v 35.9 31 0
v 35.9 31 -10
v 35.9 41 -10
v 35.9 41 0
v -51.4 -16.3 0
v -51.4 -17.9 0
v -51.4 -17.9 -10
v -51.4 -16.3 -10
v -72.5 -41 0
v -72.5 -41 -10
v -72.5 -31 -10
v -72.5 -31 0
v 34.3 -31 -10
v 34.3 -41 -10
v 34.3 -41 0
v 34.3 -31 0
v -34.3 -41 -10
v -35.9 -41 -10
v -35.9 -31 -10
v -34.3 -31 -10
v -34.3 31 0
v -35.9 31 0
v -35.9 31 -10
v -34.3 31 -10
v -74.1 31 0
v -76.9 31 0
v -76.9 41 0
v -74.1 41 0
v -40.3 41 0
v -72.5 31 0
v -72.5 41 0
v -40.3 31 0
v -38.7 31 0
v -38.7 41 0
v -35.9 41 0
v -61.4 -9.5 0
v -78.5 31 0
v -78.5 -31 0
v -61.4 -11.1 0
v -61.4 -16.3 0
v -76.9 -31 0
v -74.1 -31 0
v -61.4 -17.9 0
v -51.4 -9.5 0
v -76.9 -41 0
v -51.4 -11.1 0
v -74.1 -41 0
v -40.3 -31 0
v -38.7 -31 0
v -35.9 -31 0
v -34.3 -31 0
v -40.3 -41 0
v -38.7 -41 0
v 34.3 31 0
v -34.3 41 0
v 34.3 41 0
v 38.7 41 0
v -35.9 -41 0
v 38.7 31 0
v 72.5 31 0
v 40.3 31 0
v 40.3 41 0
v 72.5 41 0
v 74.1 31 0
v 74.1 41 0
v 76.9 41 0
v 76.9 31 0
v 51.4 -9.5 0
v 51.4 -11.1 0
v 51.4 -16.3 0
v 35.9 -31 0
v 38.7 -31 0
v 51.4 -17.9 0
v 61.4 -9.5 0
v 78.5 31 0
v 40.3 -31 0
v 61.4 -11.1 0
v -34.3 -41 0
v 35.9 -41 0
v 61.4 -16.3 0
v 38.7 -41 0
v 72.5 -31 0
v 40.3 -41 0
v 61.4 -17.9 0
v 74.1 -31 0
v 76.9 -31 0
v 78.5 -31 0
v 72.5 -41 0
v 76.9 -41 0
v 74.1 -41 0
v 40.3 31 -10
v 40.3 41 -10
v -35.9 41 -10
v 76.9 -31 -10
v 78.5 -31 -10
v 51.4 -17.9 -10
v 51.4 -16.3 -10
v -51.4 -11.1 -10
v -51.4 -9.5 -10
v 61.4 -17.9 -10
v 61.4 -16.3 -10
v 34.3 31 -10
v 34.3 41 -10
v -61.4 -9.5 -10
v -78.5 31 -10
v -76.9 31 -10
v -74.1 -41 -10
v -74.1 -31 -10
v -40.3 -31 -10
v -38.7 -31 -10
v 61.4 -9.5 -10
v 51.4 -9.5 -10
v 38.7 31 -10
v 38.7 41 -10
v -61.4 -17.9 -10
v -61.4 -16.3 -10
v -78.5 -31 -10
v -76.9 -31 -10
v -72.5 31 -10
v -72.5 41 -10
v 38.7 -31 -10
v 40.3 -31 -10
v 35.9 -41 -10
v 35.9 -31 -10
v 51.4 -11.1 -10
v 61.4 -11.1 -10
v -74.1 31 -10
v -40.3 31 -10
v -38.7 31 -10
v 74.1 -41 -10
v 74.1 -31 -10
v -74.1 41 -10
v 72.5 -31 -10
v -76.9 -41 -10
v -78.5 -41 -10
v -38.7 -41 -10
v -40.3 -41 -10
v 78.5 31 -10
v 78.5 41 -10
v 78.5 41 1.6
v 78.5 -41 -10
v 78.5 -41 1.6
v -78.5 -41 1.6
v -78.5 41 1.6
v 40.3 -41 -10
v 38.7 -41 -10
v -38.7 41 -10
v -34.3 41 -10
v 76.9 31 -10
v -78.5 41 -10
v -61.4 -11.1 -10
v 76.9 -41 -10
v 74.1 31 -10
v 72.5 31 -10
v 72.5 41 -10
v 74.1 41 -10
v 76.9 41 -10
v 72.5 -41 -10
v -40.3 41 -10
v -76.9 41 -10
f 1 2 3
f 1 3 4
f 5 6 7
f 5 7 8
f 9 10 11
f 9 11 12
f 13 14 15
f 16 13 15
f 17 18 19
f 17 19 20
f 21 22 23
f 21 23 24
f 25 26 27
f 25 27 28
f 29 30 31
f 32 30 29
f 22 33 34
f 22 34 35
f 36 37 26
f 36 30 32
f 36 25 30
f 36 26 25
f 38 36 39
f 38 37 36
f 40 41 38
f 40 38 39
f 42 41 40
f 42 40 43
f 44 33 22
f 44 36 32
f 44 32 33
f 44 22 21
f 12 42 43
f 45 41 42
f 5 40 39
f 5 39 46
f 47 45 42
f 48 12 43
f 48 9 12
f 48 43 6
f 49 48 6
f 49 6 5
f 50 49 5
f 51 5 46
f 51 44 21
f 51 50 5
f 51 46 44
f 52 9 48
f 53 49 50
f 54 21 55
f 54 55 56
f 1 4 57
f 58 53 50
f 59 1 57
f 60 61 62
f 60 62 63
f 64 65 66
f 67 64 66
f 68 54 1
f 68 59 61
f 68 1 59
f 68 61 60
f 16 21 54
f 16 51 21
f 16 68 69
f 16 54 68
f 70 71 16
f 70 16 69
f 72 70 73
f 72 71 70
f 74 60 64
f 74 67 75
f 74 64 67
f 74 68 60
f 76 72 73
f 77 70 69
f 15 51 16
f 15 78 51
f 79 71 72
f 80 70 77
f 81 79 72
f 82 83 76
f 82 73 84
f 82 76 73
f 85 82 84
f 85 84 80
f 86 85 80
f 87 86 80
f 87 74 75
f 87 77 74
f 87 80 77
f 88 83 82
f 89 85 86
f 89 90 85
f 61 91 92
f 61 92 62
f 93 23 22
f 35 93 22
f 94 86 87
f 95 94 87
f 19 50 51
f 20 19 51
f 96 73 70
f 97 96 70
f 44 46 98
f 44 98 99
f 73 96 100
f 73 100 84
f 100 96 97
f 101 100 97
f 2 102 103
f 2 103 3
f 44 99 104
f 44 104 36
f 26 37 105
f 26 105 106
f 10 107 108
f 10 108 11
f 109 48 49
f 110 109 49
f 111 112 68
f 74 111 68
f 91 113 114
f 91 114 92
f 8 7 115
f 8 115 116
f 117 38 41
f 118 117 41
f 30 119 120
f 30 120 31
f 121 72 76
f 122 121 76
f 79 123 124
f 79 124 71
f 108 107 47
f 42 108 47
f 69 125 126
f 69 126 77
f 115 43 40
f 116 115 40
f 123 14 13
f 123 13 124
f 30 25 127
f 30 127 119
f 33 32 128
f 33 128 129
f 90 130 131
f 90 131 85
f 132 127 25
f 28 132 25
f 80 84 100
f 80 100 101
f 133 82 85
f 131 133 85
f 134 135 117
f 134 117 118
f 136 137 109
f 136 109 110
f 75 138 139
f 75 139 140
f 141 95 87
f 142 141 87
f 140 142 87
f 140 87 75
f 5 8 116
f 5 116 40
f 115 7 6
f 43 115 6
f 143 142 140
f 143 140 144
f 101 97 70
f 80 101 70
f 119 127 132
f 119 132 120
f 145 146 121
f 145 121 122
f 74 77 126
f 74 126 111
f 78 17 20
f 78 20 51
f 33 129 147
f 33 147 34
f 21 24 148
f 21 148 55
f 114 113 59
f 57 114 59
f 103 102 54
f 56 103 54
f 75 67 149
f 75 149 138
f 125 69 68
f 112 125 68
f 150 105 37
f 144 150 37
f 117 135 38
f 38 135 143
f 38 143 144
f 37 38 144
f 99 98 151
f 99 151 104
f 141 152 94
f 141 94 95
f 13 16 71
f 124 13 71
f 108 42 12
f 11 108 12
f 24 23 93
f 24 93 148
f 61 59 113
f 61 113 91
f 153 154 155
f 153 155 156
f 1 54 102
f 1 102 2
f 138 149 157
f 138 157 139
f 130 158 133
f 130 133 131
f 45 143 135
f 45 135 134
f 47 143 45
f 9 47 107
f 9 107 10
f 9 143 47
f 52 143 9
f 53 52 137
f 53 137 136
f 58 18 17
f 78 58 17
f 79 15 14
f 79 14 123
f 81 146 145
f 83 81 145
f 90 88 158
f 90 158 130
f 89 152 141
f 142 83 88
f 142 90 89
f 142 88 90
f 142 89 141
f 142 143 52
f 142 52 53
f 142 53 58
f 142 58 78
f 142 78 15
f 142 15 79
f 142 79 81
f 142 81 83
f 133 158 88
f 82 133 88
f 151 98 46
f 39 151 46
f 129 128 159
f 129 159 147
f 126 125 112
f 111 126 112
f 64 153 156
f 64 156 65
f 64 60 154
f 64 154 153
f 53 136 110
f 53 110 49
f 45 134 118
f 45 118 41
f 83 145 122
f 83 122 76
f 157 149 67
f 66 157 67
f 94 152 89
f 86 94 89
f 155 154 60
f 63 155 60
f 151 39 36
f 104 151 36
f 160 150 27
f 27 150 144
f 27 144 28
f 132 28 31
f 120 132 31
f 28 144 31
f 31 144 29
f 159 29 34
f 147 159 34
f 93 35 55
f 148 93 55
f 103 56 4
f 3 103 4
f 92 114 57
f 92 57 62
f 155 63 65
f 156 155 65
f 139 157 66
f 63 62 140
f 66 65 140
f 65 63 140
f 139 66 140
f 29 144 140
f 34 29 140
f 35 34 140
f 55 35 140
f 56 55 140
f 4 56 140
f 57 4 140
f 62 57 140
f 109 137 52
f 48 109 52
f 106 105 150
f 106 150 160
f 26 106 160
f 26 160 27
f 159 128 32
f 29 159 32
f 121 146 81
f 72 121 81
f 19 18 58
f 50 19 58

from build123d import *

# Parameters (mm, degrees)
F2_DEPTH = 82
F1_W     = 1.6
F1_H     = 10
F3_DEPTH = 10
F4_START = -72
F4_DEPTH = 10
F6_W     = 1.6
F6_H     = 10
F7_DEPTH = 10
F8_START = 102.8
F8_DEPTH = 10


with BuildPart() as f2:
    # F1 (on offset) → F2 (new body)
    with BuildSketch(Plane.XZ.offset(41)):
        Polygon((78.5, 0), (78.5, 1.6), (-78.5, 1.6), (-78.5, 0), (-76.9, 0), (-74.1, 0), (-72.5, 0), (-40.3, 0), (-38.7, 0), (-35.9, 0), (-34.3, 0), (34.3, 0), (35.9, 0), (38.7, 0), (40.3, 0), (72.5, 0), (74.1, 0), (76.9, 0), align=None)
    extrude(amount=-F2_DEPTH)

    # F1 (on offset) → F3 (join)
    with BuildSketch(Plane.XZ.offset(41)):
        with Locations((-77.7, -5)):
            Rectangle(F1_W, F1_H)
        with Locations((-73.3, -5)):
            Rectangle(F1_W, F1_H)
        with Locations((-39.5, -5)):
            Rectangle(F1_W, F1_H)
        with Locations((-35.1, -5)):
            Rectangle(F1_W, F1_H)
        with Locations((35.1, -5)):
            Rectangle(F1_W, F1_H)
        with Locations((39.5, -5)):
            Rectangle(F1_W, F1_H)
        with Locations((73.3, -5)):
            Rectangle(F1_W, F1_H)
        with Locations((77.7, -5)):
            Rectangle(F1_W, F1_H)
    extrude(amount=-F3_DEPTH)

    # F1 (on offset) → F4 (join)
    with BuildSketch(Plane.XZ.offset(41).offset(F4_START)):
        with Locations((-77.7, -5)):
            Rectangle(F1_W, F1_H)
        with Locations((-73.3, -5)):
            Rectangle(F1_W, F1_H)
        with Locations((-39.5, -5)):
            Rectangle(F1_W, F1_H)
        with Locations((-35.1, -5)):
            Rectangle(F1_W, F1_H)
        with Locations((39.5, -5)):
            Rectangle(F1_W, F1_H)
        with Locations((35.1, -5)):
            Rectangle(F1_W, F1_H)
        with Locations((73.3, -5)):
            Rectangle(F1_W, F1_H)
        with Locations((77.7, -5)):
            Rectangle(F1_W, F1_H)
    extrude(amount=-F4_DEPTH)

    # F6 (on offset) → F7 (join)
    with BuildSketch(Plane.YZ.offset(-51.4)):
        with Locations((-10.3, -5)):
            Rectangle(F6_W, F6_H)
        with Locations((-17.1, -5)):
            Rectangle(F6_W, F6_H)
    extrude(amount=-F7_DEPTH)

    # F6 (on offset) → F8 (join)
    with BuildSketch(Plane.YZ.offset(-51.4).offset(F8_START)):
        with Locations((-10.3, -5)):
            Rectangle(F6_W, F6_H)
        with Locations((-17.1, -5)):
            Rectangle(F6_W, F6_H)
    extrude(amount=F8_DEPTH)


solid = f2.part
